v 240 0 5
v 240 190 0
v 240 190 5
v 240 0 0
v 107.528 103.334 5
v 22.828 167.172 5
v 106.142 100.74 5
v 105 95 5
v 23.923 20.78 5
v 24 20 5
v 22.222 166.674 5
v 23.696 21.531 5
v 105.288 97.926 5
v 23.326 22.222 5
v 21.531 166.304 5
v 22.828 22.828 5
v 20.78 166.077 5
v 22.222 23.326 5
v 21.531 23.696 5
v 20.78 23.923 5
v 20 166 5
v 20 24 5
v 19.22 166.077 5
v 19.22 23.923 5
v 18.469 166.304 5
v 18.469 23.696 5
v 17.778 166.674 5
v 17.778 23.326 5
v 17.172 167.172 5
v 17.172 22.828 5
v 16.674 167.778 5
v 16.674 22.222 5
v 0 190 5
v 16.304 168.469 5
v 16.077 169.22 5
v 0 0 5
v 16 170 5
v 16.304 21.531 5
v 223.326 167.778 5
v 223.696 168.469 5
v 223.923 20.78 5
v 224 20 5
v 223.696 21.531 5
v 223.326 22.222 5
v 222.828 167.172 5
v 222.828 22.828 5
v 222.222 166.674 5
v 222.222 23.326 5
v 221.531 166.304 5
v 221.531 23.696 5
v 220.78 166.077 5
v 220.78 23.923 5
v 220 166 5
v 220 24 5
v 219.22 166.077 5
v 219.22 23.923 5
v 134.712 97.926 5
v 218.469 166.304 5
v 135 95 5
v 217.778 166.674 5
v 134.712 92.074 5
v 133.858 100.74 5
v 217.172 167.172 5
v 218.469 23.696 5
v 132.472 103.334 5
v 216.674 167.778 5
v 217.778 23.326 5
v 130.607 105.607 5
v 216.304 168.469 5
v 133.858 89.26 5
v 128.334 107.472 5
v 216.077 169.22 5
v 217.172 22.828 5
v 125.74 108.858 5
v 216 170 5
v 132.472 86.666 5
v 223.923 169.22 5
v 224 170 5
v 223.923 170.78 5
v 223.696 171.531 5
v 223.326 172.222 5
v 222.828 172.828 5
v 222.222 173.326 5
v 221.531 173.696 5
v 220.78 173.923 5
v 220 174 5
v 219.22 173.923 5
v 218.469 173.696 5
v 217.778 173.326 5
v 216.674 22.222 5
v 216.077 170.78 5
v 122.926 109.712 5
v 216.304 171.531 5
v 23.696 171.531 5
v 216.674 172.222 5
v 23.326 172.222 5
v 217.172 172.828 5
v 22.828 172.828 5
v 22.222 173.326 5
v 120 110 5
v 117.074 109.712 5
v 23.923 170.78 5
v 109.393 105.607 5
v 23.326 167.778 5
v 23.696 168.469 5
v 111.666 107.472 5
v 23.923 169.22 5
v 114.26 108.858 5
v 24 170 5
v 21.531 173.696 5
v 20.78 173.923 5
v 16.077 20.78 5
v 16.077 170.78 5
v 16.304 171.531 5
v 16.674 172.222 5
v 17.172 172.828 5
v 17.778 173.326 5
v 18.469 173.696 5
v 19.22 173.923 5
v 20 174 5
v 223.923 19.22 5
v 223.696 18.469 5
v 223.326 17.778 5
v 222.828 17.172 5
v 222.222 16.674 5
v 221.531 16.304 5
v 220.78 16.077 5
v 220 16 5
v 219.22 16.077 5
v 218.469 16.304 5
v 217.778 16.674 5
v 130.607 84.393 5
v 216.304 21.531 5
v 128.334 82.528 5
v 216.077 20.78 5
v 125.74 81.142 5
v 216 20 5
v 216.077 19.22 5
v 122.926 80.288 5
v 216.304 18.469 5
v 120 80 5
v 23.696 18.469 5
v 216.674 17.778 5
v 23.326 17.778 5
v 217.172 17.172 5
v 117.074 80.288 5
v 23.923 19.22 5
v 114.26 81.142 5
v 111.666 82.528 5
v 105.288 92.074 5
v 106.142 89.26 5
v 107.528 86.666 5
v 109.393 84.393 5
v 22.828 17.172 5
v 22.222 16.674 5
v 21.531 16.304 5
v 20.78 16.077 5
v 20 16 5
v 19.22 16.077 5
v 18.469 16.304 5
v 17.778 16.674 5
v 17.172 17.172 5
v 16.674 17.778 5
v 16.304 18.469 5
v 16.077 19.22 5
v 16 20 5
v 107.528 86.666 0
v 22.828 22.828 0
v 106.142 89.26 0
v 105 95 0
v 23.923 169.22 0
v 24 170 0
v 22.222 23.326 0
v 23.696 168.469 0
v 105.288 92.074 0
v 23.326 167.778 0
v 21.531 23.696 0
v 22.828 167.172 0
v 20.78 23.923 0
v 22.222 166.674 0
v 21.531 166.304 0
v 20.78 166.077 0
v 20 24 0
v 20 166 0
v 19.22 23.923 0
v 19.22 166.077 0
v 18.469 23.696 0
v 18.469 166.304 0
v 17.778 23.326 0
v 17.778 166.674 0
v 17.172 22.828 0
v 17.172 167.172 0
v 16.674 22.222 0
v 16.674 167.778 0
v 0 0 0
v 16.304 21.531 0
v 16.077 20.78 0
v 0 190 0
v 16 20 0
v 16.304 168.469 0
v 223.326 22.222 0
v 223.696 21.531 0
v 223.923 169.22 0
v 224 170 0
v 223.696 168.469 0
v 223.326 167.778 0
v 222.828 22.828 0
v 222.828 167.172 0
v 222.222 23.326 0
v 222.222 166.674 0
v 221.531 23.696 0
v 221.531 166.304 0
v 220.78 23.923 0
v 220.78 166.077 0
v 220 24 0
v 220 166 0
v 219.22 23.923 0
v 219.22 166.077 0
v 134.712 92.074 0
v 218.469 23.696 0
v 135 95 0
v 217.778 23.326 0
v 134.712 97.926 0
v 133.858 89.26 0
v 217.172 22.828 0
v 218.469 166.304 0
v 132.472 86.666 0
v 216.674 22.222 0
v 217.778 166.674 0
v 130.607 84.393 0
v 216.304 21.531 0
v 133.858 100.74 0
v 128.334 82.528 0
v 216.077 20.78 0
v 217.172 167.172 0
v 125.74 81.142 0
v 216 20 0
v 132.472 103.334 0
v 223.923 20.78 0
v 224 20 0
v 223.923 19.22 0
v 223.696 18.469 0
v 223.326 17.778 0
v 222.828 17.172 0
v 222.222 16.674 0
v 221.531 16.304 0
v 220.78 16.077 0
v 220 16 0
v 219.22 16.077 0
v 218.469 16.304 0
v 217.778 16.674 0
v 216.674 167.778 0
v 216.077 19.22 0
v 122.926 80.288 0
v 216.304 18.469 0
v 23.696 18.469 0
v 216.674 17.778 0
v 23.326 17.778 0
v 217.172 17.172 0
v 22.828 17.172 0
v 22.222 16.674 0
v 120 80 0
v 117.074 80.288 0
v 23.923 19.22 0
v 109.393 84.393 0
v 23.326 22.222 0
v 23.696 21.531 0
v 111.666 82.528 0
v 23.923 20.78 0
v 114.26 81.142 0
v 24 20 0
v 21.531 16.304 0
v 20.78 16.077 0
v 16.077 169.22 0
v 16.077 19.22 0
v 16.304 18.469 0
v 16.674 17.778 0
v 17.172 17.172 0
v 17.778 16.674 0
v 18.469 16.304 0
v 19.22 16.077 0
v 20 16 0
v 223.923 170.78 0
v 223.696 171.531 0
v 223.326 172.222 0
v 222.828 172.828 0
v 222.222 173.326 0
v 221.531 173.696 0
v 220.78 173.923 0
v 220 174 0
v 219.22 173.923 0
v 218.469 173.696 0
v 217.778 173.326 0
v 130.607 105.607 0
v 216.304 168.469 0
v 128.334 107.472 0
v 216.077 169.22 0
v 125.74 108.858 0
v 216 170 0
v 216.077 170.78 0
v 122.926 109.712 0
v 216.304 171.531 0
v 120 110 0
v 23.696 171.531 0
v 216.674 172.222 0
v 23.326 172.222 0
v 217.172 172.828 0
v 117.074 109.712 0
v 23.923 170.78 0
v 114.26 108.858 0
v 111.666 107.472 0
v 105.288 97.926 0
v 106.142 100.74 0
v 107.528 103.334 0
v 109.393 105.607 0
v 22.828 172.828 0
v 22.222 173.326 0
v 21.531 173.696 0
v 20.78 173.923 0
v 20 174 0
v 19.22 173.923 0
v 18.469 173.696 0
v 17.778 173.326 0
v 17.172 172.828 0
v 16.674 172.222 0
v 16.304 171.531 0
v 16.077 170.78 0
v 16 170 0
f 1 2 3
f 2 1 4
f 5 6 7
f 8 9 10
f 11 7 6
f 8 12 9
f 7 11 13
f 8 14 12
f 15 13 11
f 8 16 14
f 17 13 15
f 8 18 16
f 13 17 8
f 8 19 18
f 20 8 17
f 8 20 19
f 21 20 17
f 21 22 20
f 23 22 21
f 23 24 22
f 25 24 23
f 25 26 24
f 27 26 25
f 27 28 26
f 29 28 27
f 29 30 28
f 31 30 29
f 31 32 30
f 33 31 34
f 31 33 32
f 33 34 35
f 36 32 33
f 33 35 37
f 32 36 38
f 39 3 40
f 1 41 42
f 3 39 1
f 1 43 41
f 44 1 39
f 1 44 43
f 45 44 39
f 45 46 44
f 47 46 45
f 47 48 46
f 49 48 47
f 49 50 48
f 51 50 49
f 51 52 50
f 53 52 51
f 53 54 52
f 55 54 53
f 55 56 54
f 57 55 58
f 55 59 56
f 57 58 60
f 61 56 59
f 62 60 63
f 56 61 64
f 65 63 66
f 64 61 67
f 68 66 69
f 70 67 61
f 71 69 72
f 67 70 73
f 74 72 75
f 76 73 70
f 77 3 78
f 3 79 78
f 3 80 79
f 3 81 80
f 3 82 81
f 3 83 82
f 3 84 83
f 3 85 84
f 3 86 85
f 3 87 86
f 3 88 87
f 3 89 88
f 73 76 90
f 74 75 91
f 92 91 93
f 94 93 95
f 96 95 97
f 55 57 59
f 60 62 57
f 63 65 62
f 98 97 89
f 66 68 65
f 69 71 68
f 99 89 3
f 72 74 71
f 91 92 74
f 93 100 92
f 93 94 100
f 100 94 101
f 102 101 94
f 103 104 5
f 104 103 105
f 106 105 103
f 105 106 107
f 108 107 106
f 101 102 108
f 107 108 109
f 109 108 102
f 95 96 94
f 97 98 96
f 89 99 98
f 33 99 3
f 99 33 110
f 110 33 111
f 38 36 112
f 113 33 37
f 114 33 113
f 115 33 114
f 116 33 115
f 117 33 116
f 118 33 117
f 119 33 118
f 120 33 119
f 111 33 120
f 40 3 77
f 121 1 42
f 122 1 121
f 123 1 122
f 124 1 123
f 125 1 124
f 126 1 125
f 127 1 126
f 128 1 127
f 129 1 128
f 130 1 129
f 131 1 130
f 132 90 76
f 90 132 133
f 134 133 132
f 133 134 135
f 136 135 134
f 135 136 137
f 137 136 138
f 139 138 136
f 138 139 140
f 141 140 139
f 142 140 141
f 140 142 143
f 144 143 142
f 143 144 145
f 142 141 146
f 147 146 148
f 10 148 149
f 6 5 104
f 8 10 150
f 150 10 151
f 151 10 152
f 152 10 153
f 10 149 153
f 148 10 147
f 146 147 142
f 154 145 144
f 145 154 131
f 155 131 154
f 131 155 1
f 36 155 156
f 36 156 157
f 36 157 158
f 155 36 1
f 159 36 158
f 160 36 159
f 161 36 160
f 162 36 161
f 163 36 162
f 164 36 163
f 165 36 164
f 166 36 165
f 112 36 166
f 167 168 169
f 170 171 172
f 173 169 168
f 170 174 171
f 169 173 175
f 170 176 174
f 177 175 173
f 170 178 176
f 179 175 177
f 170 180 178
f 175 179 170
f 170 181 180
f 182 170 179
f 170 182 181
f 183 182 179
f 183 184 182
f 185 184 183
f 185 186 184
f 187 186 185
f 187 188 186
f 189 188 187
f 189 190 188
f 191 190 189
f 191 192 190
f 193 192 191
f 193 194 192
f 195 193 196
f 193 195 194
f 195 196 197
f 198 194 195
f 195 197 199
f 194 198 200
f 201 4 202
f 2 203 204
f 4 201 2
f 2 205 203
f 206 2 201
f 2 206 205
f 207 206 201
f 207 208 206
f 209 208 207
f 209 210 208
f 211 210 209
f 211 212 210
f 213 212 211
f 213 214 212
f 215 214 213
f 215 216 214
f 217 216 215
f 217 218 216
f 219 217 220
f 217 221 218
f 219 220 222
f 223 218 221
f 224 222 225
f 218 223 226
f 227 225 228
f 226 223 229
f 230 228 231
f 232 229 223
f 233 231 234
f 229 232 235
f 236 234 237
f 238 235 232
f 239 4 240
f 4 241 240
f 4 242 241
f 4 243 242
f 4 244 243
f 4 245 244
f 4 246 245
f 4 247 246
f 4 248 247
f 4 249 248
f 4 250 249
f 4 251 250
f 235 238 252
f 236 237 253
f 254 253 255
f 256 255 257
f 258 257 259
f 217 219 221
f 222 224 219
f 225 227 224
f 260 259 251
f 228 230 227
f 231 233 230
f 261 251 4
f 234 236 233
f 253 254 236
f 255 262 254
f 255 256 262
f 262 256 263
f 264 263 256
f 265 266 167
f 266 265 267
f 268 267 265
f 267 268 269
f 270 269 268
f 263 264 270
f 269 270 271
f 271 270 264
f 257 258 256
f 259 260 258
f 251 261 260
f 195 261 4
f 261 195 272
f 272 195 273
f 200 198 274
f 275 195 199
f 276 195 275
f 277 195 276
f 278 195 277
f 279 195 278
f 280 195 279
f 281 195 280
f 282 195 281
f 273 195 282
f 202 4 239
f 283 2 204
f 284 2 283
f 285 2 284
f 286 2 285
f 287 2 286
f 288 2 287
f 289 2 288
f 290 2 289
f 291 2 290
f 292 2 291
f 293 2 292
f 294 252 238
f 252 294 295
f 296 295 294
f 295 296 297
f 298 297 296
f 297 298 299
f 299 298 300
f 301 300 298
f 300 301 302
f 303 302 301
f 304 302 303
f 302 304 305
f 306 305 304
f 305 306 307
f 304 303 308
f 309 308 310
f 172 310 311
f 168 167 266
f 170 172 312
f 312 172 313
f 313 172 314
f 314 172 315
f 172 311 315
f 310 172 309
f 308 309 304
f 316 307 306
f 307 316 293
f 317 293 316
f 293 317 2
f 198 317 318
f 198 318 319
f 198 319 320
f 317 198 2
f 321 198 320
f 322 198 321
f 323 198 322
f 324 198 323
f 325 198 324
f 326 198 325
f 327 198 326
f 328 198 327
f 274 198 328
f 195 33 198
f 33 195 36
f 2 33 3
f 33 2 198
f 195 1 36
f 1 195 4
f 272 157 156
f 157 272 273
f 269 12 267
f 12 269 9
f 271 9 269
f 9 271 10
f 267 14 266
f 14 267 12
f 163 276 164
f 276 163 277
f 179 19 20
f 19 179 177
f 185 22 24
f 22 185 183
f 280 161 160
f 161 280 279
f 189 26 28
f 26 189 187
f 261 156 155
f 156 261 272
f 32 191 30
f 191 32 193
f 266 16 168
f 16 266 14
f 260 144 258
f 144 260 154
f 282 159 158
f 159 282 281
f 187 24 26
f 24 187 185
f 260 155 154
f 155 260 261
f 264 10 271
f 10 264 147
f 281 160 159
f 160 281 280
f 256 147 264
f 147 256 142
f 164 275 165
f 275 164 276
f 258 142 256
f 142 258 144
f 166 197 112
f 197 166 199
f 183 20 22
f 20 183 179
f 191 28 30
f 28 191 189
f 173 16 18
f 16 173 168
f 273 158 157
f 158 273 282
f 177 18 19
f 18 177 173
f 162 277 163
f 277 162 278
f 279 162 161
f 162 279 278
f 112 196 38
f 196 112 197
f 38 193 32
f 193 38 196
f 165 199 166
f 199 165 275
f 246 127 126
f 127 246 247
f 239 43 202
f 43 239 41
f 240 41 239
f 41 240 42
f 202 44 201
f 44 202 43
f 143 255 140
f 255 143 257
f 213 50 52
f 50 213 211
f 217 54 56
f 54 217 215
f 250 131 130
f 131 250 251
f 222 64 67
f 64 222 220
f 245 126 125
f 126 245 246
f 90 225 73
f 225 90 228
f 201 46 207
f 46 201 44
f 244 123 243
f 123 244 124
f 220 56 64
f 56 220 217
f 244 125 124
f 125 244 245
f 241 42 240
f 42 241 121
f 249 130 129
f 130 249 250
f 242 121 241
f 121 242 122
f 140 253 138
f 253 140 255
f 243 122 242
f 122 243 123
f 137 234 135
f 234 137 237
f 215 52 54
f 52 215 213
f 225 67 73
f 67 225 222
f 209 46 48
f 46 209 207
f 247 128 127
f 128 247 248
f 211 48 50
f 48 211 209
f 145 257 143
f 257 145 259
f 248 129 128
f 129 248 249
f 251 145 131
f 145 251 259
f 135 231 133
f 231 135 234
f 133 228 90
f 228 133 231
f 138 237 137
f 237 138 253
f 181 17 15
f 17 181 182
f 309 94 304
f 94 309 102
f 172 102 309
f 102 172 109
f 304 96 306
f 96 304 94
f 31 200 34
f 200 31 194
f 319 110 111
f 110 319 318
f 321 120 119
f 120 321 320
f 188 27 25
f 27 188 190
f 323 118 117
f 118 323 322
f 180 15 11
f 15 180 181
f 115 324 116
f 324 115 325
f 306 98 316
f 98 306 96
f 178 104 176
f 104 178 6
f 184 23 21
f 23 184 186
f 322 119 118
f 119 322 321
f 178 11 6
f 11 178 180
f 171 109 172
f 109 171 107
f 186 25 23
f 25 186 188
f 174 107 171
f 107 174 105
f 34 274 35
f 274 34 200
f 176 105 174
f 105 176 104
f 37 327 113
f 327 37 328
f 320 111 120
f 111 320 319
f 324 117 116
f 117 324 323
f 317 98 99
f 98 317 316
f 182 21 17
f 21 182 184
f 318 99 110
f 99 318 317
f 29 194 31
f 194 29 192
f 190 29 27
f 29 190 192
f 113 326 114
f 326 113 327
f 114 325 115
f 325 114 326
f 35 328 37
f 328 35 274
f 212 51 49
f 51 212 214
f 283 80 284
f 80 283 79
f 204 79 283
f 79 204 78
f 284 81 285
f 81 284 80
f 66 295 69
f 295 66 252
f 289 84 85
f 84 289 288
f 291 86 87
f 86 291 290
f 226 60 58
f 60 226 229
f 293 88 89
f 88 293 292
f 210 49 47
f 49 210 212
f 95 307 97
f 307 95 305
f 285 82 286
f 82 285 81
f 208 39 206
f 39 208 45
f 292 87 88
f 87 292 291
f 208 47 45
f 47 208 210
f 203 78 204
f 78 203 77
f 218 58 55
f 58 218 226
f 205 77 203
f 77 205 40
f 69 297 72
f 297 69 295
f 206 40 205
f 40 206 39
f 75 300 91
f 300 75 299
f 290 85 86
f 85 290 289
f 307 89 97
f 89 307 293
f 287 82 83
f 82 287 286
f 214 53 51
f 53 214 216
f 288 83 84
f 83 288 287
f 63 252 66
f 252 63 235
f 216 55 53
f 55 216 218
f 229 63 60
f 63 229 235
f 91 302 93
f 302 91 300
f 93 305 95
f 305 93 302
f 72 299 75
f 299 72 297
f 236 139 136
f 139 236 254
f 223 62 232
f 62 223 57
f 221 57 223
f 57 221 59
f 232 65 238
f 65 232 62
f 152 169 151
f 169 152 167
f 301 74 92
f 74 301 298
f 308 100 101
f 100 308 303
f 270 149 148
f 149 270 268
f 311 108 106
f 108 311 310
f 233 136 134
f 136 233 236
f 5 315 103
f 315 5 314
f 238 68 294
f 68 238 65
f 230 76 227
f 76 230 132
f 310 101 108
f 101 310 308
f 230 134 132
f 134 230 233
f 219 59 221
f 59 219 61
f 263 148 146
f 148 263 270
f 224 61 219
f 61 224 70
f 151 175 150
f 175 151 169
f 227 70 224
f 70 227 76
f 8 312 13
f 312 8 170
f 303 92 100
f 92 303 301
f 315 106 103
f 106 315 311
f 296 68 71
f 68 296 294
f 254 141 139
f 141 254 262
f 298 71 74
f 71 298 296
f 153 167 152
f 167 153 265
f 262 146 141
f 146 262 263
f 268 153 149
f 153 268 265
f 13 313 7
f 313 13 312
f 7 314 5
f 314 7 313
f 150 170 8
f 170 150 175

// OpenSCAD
$fn = 32;

// ----------------------------------------------------------------------
// Big plate: 200-250 mm adapter plate
// ----------------------------------------------------------------------

// --- parameters (mm) ---
plate_l = 240;            // plate length, X
plate_w = 190;            // plate width, Y
plate_t = 5;              // plate thickness, Z
corner_d = 8;             // corner hole diameter
corner_in = 20;           // corner hole inset from the edges
bore_d = 30;              // central bore

difference() {
  cube([plate_l, plate_w, plate_t]);
  translate([corner_in, corner_in, -1]) cylinder(h = plate_t + 2, d = corner_d);
  translate([plate_l - corner_in, corner_in, -1]) cylinder(h = plate_t + 2, d = corner_d);
  translate([corner_in, plate_w - corner_in, -1]) cylinder(h = plate_t + 2, d = corner_d);
  translate([plate_l - corner_in, plate_w - corner_in, -1]) cylinder(h = plate_t + 2, d = corner_d);
  translate([plate_l / 2, plate_w / 2, -1]) cylinder(h = plate_t + 2, d = bore_d);
}
